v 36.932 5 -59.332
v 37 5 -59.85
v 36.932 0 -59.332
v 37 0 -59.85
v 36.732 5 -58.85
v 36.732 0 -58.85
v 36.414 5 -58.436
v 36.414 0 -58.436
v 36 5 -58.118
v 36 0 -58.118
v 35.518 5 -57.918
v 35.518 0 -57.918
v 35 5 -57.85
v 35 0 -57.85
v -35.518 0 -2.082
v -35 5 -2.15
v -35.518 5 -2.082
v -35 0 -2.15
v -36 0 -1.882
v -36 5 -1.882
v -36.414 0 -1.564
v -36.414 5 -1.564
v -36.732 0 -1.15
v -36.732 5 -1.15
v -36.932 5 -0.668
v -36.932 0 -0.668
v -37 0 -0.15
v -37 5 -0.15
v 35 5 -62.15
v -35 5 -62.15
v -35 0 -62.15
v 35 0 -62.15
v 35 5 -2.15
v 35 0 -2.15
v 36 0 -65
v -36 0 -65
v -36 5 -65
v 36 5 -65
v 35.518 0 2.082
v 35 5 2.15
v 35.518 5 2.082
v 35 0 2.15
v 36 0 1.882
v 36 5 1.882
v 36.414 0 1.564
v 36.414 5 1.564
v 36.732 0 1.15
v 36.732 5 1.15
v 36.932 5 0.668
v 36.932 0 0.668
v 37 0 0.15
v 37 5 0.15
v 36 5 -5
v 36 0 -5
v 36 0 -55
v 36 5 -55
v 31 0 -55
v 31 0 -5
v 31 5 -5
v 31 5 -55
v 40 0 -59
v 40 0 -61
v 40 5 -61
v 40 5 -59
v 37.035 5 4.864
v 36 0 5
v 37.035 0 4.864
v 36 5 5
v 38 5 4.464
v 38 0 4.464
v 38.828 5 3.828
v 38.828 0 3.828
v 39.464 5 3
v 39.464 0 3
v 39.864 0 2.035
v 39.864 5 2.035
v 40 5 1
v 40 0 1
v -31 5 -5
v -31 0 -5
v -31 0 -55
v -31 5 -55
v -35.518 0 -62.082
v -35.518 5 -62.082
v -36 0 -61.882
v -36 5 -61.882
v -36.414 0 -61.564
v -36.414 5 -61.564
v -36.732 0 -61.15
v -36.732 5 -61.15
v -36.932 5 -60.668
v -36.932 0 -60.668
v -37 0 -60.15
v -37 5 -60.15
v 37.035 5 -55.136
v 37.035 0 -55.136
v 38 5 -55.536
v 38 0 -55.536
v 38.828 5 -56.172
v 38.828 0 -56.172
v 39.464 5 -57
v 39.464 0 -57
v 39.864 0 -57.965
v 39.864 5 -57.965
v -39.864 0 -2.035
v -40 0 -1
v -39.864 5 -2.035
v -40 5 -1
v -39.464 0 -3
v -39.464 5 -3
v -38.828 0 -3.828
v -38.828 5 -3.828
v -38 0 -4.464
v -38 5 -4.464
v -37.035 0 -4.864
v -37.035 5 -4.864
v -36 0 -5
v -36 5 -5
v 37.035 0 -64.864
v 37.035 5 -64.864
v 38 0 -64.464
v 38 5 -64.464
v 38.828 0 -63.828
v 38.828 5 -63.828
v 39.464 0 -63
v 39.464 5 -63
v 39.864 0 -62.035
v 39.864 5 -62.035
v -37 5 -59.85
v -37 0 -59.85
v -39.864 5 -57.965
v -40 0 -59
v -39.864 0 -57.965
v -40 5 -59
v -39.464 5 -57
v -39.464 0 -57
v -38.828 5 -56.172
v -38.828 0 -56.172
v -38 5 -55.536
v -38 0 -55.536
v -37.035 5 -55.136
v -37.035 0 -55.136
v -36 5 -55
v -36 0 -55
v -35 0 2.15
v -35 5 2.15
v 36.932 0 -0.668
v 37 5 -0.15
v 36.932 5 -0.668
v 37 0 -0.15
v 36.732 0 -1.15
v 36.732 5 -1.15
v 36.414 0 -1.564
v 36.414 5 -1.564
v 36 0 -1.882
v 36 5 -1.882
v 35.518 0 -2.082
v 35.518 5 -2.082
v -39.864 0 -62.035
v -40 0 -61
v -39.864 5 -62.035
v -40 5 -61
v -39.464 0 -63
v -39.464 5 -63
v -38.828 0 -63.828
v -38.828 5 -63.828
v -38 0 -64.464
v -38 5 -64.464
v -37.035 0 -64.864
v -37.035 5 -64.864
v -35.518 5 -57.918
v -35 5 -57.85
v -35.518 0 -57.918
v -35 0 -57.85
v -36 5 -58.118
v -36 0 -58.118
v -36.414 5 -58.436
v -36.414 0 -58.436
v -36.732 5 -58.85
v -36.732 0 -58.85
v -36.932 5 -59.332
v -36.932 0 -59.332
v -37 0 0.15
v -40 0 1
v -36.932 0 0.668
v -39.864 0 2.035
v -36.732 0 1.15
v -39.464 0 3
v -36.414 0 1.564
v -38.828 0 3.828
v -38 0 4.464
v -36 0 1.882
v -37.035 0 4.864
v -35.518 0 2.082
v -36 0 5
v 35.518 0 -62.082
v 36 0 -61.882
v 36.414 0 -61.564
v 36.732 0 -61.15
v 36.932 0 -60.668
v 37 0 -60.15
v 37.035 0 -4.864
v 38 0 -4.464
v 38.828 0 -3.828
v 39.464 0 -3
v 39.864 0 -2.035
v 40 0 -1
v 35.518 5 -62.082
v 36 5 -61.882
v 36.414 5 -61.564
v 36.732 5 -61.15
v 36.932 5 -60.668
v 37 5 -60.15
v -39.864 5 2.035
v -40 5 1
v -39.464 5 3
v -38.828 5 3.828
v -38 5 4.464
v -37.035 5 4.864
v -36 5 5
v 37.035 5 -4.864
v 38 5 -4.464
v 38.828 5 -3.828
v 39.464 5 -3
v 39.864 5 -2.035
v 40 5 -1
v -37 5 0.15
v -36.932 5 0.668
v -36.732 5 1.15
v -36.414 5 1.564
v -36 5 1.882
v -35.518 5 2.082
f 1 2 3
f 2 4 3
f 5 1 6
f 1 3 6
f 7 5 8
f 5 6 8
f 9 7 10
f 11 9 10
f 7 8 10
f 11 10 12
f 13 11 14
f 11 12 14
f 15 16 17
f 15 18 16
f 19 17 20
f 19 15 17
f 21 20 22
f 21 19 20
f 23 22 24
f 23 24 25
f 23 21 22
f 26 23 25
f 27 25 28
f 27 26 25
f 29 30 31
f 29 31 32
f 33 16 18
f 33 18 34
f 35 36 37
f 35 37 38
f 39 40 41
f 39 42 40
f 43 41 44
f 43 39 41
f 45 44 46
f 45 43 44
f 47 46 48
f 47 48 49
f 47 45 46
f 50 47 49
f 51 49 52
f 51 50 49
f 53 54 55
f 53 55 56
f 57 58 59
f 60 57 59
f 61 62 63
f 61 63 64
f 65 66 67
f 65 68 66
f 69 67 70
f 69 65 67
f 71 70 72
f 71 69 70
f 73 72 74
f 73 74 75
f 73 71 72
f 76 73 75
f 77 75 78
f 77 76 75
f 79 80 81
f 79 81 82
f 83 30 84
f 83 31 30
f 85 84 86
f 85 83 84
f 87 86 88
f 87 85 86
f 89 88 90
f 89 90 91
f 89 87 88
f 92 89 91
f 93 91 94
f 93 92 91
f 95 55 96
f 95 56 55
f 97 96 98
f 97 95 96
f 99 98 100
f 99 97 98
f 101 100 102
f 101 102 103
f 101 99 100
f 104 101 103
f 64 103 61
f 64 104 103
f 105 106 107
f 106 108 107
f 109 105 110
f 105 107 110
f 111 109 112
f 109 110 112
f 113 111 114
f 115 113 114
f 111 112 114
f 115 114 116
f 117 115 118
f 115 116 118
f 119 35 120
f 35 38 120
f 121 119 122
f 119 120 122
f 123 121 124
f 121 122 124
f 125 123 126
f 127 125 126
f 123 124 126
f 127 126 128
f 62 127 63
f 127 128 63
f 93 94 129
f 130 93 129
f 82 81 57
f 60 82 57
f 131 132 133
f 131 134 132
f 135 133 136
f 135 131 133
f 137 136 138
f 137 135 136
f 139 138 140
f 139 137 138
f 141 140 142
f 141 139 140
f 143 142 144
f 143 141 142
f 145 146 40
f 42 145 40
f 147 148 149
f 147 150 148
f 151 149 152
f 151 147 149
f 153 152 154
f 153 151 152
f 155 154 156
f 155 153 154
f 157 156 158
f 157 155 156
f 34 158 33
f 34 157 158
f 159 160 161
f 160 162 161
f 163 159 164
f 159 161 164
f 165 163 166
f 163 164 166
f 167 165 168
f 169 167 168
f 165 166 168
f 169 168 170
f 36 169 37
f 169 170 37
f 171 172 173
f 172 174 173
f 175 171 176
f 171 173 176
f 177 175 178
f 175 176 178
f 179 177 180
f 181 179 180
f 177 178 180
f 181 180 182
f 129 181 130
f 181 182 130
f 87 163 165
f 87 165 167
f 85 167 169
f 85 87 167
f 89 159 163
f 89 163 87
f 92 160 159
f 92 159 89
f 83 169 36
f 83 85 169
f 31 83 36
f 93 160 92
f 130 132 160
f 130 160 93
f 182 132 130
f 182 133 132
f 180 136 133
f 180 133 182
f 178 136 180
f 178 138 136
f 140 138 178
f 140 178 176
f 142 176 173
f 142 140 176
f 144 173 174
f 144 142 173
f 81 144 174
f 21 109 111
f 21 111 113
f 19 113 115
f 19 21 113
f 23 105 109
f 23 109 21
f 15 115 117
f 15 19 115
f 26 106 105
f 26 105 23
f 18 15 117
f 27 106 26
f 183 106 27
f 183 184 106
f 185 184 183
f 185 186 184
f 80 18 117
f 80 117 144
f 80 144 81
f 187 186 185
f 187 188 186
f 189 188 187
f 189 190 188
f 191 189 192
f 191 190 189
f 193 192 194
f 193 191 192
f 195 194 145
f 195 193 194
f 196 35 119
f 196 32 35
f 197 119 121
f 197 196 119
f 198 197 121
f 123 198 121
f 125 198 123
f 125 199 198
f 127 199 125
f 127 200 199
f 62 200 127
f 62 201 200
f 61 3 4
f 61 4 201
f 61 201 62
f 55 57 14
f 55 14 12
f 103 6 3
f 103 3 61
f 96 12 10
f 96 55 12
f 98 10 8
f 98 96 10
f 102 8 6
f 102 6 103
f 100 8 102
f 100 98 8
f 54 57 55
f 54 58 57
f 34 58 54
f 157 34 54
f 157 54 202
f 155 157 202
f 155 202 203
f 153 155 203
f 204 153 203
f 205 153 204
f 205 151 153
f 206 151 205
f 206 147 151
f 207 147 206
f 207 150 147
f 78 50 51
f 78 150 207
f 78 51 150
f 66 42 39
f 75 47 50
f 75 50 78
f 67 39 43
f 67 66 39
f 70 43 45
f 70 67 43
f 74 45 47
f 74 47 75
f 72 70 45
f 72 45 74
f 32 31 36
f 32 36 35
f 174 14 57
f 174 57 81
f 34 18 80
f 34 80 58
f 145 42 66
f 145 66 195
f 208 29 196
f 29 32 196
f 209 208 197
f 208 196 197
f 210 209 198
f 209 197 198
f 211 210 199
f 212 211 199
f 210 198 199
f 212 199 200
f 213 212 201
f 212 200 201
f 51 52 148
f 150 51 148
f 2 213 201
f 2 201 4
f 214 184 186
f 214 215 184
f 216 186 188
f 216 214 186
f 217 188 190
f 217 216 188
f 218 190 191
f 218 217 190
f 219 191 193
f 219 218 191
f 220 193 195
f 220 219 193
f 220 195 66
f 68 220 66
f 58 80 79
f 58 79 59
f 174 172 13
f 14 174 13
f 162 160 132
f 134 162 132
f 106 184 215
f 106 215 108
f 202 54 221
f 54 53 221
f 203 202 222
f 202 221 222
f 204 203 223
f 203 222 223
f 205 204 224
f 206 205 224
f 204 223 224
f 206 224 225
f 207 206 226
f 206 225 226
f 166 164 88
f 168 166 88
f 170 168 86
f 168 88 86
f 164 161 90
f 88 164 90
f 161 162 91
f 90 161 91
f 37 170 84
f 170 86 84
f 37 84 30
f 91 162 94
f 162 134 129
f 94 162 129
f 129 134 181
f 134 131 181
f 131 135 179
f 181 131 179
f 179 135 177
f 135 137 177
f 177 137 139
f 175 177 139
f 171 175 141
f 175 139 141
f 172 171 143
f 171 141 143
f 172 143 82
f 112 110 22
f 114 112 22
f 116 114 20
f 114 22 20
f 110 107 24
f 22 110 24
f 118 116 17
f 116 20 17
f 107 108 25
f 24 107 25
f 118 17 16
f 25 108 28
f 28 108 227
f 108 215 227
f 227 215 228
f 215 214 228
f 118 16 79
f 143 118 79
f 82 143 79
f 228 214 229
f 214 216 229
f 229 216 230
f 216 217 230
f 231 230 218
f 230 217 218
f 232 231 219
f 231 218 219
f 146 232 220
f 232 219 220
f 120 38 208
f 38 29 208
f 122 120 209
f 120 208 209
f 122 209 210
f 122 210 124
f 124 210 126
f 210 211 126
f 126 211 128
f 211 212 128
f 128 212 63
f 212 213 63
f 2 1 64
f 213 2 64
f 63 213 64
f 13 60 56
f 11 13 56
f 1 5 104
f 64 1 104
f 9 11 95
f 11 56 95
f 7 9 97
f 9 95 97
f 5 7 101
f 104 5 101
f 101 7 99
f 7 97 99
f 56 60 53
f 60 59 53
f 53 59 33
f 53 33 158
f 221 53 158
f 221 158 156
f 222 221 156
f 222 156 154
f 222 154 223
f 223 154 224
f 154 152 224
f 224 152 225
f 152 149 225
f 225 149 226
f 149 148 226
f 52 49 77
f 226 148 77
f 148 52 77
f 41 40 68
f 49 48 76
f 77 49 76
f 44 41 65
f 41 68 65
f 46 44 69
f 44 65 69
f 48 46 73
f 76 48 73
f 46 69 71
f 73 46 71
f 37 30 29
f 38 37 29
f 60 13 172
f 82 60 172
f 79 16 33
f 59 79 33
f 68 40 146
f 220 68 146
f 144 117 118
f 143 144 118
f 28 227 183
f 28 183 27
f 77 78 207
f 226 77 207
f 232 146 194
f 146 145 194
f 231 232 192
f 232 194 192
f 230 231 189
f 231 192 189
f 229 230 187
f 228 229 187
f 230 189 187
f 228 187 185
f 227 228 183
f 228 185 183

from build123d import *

# Parameters (mm, degrees)
SKETCH1_W            = 80
SKETCH1_H            = 10
BOSS_EXTRUDE1_DEPTH  = 5
SKETCH2_W            = 74
SKETCH2_H            = 4.3
CUT_EXTRUDE1_DEPTH   = 5
FILLET1_R            = 4
FILLET2_R            = 2
SKETCH3_W            = 5
SKETCH3_H            = 5
BOSS_EXTRUDE2_DEPTH  = 50
FILLET1_OF_MIRROR1_R = 4
FILLET2_OF_MIRROR1_R = 2


with BuildPart() as part:
    # Sketch1 → Boss-Extrude1 (new body)
    with BuildSketch(Plane(origin=(0, 0, 0), x_dir=(1, 0, 0), z_dir=(0, 1, 0))):
        Rectangle(SKETCH1_W, SKETCH1_H)
    boss_extrude1 = extrude(amount=BOSS_EXTRUDE1_DEPTH)

    # Sketch2 → Cut-Extrude1 (cut)
    with BuildSketch(Plane(origin=(0, 5, 0), x_dir=(1, 0, 0), z_dir=(0, 1, 0))):
        Rectangle(SKETCH2_W, SKETCH2_H)
    cut_extrude1 = extrude(amount=-CUT_EXTRUDE1_DEPTH, mode=Mode.SUBTRACT)

    # Fillet1
    fillet1_edges = [part.edges().sort_by_distance(p)[0] for p in [
        (40, 2.5, 5),
        (-40, 2.5, 5),
        (-40, 2.5, -5),
        (40, 2.5, -5),
    ]]
    fillet(fillet1_edges, radius=FILLET1_R)

    # Fillet2
    fillet2_edges = [part.edges().sort_by_distance(p)[0] for p in [
        (37, 2.5, -2.15),
        (37, 2.5, 2.15),
        (-37, 2.5, 2.15),
        (-37, 2.5, -2.15),
    ]]
    fillet(fillet2_edges, radius=FILLET2_R)

    # Sketch3 → Boss-Extrude2 (add)
    with BuildSketch(Plane(origin=(0, 0, -5), x_dir=(-1, 0, 0), z_dir=(0, 0, -1))):
        with Locations((-33.5, 2.5)):
            Rectangle(SKETCH3_W, SKETCH3_H)
        with Locations((33.5, 2.5)):
            Rectangle(SKETCH3_W, SKETCH3_H)
    extrude(amount=BOSS_EXTRUDE2_DEPTH)


with BuildPart() as mirror1_1:
    # Mirror1: Boss-Extrude1 across plane
    add(boss_extrude1.mirror(Plane(origin=(0, 0, -30), x_dir=(1, 0, 0), z_dir=(0, 0, -1))))

    # Mirror1 2: Cut-Extrude1 across plane
    add(cut_extrude1.mirror(Plane(origin=(0, 0, -30), x_dir=(1, 0, 0), z_dir=(0, 0, -1))), mode=Mode.SUBTRACT)

    # Fillet1 of Mirror1
    fillet1_of_mirror1_edges = [mirror1_1.edges().sort_by_distance(p)[0] for p in [
        (40, 2.5, -65),
        (-40, 2.5, -65),
        (-40, 2.5, -55),
        (40, 2.5, -55),
    ]]
    fillet(fillet1_of_mirror1_edges, radius=FILLET1_OF_MIRROR1_R)

    # Fillet2 of Mirror1
    fillet2_of_mirror1_edges = [mirror1_1.edges().sort_by_distance(p)[0] for p in [
        (37, 2.5, -57.85),
        (37, 2.5, -62.15),
        (-37, 2.5, -62.15),
        (-37, 2.5, -57.85),
    ]]
    fillet(fillet2_of_mirror1_edges, radius=FILLET2_OF_MIRROR1_R)


with BuildPart() as part_1:
    add(part.part)

    # Mirror1 united with what the copies touc: union Mirror1_1
    add(mirror1_1.part)


solid = part_1.part
